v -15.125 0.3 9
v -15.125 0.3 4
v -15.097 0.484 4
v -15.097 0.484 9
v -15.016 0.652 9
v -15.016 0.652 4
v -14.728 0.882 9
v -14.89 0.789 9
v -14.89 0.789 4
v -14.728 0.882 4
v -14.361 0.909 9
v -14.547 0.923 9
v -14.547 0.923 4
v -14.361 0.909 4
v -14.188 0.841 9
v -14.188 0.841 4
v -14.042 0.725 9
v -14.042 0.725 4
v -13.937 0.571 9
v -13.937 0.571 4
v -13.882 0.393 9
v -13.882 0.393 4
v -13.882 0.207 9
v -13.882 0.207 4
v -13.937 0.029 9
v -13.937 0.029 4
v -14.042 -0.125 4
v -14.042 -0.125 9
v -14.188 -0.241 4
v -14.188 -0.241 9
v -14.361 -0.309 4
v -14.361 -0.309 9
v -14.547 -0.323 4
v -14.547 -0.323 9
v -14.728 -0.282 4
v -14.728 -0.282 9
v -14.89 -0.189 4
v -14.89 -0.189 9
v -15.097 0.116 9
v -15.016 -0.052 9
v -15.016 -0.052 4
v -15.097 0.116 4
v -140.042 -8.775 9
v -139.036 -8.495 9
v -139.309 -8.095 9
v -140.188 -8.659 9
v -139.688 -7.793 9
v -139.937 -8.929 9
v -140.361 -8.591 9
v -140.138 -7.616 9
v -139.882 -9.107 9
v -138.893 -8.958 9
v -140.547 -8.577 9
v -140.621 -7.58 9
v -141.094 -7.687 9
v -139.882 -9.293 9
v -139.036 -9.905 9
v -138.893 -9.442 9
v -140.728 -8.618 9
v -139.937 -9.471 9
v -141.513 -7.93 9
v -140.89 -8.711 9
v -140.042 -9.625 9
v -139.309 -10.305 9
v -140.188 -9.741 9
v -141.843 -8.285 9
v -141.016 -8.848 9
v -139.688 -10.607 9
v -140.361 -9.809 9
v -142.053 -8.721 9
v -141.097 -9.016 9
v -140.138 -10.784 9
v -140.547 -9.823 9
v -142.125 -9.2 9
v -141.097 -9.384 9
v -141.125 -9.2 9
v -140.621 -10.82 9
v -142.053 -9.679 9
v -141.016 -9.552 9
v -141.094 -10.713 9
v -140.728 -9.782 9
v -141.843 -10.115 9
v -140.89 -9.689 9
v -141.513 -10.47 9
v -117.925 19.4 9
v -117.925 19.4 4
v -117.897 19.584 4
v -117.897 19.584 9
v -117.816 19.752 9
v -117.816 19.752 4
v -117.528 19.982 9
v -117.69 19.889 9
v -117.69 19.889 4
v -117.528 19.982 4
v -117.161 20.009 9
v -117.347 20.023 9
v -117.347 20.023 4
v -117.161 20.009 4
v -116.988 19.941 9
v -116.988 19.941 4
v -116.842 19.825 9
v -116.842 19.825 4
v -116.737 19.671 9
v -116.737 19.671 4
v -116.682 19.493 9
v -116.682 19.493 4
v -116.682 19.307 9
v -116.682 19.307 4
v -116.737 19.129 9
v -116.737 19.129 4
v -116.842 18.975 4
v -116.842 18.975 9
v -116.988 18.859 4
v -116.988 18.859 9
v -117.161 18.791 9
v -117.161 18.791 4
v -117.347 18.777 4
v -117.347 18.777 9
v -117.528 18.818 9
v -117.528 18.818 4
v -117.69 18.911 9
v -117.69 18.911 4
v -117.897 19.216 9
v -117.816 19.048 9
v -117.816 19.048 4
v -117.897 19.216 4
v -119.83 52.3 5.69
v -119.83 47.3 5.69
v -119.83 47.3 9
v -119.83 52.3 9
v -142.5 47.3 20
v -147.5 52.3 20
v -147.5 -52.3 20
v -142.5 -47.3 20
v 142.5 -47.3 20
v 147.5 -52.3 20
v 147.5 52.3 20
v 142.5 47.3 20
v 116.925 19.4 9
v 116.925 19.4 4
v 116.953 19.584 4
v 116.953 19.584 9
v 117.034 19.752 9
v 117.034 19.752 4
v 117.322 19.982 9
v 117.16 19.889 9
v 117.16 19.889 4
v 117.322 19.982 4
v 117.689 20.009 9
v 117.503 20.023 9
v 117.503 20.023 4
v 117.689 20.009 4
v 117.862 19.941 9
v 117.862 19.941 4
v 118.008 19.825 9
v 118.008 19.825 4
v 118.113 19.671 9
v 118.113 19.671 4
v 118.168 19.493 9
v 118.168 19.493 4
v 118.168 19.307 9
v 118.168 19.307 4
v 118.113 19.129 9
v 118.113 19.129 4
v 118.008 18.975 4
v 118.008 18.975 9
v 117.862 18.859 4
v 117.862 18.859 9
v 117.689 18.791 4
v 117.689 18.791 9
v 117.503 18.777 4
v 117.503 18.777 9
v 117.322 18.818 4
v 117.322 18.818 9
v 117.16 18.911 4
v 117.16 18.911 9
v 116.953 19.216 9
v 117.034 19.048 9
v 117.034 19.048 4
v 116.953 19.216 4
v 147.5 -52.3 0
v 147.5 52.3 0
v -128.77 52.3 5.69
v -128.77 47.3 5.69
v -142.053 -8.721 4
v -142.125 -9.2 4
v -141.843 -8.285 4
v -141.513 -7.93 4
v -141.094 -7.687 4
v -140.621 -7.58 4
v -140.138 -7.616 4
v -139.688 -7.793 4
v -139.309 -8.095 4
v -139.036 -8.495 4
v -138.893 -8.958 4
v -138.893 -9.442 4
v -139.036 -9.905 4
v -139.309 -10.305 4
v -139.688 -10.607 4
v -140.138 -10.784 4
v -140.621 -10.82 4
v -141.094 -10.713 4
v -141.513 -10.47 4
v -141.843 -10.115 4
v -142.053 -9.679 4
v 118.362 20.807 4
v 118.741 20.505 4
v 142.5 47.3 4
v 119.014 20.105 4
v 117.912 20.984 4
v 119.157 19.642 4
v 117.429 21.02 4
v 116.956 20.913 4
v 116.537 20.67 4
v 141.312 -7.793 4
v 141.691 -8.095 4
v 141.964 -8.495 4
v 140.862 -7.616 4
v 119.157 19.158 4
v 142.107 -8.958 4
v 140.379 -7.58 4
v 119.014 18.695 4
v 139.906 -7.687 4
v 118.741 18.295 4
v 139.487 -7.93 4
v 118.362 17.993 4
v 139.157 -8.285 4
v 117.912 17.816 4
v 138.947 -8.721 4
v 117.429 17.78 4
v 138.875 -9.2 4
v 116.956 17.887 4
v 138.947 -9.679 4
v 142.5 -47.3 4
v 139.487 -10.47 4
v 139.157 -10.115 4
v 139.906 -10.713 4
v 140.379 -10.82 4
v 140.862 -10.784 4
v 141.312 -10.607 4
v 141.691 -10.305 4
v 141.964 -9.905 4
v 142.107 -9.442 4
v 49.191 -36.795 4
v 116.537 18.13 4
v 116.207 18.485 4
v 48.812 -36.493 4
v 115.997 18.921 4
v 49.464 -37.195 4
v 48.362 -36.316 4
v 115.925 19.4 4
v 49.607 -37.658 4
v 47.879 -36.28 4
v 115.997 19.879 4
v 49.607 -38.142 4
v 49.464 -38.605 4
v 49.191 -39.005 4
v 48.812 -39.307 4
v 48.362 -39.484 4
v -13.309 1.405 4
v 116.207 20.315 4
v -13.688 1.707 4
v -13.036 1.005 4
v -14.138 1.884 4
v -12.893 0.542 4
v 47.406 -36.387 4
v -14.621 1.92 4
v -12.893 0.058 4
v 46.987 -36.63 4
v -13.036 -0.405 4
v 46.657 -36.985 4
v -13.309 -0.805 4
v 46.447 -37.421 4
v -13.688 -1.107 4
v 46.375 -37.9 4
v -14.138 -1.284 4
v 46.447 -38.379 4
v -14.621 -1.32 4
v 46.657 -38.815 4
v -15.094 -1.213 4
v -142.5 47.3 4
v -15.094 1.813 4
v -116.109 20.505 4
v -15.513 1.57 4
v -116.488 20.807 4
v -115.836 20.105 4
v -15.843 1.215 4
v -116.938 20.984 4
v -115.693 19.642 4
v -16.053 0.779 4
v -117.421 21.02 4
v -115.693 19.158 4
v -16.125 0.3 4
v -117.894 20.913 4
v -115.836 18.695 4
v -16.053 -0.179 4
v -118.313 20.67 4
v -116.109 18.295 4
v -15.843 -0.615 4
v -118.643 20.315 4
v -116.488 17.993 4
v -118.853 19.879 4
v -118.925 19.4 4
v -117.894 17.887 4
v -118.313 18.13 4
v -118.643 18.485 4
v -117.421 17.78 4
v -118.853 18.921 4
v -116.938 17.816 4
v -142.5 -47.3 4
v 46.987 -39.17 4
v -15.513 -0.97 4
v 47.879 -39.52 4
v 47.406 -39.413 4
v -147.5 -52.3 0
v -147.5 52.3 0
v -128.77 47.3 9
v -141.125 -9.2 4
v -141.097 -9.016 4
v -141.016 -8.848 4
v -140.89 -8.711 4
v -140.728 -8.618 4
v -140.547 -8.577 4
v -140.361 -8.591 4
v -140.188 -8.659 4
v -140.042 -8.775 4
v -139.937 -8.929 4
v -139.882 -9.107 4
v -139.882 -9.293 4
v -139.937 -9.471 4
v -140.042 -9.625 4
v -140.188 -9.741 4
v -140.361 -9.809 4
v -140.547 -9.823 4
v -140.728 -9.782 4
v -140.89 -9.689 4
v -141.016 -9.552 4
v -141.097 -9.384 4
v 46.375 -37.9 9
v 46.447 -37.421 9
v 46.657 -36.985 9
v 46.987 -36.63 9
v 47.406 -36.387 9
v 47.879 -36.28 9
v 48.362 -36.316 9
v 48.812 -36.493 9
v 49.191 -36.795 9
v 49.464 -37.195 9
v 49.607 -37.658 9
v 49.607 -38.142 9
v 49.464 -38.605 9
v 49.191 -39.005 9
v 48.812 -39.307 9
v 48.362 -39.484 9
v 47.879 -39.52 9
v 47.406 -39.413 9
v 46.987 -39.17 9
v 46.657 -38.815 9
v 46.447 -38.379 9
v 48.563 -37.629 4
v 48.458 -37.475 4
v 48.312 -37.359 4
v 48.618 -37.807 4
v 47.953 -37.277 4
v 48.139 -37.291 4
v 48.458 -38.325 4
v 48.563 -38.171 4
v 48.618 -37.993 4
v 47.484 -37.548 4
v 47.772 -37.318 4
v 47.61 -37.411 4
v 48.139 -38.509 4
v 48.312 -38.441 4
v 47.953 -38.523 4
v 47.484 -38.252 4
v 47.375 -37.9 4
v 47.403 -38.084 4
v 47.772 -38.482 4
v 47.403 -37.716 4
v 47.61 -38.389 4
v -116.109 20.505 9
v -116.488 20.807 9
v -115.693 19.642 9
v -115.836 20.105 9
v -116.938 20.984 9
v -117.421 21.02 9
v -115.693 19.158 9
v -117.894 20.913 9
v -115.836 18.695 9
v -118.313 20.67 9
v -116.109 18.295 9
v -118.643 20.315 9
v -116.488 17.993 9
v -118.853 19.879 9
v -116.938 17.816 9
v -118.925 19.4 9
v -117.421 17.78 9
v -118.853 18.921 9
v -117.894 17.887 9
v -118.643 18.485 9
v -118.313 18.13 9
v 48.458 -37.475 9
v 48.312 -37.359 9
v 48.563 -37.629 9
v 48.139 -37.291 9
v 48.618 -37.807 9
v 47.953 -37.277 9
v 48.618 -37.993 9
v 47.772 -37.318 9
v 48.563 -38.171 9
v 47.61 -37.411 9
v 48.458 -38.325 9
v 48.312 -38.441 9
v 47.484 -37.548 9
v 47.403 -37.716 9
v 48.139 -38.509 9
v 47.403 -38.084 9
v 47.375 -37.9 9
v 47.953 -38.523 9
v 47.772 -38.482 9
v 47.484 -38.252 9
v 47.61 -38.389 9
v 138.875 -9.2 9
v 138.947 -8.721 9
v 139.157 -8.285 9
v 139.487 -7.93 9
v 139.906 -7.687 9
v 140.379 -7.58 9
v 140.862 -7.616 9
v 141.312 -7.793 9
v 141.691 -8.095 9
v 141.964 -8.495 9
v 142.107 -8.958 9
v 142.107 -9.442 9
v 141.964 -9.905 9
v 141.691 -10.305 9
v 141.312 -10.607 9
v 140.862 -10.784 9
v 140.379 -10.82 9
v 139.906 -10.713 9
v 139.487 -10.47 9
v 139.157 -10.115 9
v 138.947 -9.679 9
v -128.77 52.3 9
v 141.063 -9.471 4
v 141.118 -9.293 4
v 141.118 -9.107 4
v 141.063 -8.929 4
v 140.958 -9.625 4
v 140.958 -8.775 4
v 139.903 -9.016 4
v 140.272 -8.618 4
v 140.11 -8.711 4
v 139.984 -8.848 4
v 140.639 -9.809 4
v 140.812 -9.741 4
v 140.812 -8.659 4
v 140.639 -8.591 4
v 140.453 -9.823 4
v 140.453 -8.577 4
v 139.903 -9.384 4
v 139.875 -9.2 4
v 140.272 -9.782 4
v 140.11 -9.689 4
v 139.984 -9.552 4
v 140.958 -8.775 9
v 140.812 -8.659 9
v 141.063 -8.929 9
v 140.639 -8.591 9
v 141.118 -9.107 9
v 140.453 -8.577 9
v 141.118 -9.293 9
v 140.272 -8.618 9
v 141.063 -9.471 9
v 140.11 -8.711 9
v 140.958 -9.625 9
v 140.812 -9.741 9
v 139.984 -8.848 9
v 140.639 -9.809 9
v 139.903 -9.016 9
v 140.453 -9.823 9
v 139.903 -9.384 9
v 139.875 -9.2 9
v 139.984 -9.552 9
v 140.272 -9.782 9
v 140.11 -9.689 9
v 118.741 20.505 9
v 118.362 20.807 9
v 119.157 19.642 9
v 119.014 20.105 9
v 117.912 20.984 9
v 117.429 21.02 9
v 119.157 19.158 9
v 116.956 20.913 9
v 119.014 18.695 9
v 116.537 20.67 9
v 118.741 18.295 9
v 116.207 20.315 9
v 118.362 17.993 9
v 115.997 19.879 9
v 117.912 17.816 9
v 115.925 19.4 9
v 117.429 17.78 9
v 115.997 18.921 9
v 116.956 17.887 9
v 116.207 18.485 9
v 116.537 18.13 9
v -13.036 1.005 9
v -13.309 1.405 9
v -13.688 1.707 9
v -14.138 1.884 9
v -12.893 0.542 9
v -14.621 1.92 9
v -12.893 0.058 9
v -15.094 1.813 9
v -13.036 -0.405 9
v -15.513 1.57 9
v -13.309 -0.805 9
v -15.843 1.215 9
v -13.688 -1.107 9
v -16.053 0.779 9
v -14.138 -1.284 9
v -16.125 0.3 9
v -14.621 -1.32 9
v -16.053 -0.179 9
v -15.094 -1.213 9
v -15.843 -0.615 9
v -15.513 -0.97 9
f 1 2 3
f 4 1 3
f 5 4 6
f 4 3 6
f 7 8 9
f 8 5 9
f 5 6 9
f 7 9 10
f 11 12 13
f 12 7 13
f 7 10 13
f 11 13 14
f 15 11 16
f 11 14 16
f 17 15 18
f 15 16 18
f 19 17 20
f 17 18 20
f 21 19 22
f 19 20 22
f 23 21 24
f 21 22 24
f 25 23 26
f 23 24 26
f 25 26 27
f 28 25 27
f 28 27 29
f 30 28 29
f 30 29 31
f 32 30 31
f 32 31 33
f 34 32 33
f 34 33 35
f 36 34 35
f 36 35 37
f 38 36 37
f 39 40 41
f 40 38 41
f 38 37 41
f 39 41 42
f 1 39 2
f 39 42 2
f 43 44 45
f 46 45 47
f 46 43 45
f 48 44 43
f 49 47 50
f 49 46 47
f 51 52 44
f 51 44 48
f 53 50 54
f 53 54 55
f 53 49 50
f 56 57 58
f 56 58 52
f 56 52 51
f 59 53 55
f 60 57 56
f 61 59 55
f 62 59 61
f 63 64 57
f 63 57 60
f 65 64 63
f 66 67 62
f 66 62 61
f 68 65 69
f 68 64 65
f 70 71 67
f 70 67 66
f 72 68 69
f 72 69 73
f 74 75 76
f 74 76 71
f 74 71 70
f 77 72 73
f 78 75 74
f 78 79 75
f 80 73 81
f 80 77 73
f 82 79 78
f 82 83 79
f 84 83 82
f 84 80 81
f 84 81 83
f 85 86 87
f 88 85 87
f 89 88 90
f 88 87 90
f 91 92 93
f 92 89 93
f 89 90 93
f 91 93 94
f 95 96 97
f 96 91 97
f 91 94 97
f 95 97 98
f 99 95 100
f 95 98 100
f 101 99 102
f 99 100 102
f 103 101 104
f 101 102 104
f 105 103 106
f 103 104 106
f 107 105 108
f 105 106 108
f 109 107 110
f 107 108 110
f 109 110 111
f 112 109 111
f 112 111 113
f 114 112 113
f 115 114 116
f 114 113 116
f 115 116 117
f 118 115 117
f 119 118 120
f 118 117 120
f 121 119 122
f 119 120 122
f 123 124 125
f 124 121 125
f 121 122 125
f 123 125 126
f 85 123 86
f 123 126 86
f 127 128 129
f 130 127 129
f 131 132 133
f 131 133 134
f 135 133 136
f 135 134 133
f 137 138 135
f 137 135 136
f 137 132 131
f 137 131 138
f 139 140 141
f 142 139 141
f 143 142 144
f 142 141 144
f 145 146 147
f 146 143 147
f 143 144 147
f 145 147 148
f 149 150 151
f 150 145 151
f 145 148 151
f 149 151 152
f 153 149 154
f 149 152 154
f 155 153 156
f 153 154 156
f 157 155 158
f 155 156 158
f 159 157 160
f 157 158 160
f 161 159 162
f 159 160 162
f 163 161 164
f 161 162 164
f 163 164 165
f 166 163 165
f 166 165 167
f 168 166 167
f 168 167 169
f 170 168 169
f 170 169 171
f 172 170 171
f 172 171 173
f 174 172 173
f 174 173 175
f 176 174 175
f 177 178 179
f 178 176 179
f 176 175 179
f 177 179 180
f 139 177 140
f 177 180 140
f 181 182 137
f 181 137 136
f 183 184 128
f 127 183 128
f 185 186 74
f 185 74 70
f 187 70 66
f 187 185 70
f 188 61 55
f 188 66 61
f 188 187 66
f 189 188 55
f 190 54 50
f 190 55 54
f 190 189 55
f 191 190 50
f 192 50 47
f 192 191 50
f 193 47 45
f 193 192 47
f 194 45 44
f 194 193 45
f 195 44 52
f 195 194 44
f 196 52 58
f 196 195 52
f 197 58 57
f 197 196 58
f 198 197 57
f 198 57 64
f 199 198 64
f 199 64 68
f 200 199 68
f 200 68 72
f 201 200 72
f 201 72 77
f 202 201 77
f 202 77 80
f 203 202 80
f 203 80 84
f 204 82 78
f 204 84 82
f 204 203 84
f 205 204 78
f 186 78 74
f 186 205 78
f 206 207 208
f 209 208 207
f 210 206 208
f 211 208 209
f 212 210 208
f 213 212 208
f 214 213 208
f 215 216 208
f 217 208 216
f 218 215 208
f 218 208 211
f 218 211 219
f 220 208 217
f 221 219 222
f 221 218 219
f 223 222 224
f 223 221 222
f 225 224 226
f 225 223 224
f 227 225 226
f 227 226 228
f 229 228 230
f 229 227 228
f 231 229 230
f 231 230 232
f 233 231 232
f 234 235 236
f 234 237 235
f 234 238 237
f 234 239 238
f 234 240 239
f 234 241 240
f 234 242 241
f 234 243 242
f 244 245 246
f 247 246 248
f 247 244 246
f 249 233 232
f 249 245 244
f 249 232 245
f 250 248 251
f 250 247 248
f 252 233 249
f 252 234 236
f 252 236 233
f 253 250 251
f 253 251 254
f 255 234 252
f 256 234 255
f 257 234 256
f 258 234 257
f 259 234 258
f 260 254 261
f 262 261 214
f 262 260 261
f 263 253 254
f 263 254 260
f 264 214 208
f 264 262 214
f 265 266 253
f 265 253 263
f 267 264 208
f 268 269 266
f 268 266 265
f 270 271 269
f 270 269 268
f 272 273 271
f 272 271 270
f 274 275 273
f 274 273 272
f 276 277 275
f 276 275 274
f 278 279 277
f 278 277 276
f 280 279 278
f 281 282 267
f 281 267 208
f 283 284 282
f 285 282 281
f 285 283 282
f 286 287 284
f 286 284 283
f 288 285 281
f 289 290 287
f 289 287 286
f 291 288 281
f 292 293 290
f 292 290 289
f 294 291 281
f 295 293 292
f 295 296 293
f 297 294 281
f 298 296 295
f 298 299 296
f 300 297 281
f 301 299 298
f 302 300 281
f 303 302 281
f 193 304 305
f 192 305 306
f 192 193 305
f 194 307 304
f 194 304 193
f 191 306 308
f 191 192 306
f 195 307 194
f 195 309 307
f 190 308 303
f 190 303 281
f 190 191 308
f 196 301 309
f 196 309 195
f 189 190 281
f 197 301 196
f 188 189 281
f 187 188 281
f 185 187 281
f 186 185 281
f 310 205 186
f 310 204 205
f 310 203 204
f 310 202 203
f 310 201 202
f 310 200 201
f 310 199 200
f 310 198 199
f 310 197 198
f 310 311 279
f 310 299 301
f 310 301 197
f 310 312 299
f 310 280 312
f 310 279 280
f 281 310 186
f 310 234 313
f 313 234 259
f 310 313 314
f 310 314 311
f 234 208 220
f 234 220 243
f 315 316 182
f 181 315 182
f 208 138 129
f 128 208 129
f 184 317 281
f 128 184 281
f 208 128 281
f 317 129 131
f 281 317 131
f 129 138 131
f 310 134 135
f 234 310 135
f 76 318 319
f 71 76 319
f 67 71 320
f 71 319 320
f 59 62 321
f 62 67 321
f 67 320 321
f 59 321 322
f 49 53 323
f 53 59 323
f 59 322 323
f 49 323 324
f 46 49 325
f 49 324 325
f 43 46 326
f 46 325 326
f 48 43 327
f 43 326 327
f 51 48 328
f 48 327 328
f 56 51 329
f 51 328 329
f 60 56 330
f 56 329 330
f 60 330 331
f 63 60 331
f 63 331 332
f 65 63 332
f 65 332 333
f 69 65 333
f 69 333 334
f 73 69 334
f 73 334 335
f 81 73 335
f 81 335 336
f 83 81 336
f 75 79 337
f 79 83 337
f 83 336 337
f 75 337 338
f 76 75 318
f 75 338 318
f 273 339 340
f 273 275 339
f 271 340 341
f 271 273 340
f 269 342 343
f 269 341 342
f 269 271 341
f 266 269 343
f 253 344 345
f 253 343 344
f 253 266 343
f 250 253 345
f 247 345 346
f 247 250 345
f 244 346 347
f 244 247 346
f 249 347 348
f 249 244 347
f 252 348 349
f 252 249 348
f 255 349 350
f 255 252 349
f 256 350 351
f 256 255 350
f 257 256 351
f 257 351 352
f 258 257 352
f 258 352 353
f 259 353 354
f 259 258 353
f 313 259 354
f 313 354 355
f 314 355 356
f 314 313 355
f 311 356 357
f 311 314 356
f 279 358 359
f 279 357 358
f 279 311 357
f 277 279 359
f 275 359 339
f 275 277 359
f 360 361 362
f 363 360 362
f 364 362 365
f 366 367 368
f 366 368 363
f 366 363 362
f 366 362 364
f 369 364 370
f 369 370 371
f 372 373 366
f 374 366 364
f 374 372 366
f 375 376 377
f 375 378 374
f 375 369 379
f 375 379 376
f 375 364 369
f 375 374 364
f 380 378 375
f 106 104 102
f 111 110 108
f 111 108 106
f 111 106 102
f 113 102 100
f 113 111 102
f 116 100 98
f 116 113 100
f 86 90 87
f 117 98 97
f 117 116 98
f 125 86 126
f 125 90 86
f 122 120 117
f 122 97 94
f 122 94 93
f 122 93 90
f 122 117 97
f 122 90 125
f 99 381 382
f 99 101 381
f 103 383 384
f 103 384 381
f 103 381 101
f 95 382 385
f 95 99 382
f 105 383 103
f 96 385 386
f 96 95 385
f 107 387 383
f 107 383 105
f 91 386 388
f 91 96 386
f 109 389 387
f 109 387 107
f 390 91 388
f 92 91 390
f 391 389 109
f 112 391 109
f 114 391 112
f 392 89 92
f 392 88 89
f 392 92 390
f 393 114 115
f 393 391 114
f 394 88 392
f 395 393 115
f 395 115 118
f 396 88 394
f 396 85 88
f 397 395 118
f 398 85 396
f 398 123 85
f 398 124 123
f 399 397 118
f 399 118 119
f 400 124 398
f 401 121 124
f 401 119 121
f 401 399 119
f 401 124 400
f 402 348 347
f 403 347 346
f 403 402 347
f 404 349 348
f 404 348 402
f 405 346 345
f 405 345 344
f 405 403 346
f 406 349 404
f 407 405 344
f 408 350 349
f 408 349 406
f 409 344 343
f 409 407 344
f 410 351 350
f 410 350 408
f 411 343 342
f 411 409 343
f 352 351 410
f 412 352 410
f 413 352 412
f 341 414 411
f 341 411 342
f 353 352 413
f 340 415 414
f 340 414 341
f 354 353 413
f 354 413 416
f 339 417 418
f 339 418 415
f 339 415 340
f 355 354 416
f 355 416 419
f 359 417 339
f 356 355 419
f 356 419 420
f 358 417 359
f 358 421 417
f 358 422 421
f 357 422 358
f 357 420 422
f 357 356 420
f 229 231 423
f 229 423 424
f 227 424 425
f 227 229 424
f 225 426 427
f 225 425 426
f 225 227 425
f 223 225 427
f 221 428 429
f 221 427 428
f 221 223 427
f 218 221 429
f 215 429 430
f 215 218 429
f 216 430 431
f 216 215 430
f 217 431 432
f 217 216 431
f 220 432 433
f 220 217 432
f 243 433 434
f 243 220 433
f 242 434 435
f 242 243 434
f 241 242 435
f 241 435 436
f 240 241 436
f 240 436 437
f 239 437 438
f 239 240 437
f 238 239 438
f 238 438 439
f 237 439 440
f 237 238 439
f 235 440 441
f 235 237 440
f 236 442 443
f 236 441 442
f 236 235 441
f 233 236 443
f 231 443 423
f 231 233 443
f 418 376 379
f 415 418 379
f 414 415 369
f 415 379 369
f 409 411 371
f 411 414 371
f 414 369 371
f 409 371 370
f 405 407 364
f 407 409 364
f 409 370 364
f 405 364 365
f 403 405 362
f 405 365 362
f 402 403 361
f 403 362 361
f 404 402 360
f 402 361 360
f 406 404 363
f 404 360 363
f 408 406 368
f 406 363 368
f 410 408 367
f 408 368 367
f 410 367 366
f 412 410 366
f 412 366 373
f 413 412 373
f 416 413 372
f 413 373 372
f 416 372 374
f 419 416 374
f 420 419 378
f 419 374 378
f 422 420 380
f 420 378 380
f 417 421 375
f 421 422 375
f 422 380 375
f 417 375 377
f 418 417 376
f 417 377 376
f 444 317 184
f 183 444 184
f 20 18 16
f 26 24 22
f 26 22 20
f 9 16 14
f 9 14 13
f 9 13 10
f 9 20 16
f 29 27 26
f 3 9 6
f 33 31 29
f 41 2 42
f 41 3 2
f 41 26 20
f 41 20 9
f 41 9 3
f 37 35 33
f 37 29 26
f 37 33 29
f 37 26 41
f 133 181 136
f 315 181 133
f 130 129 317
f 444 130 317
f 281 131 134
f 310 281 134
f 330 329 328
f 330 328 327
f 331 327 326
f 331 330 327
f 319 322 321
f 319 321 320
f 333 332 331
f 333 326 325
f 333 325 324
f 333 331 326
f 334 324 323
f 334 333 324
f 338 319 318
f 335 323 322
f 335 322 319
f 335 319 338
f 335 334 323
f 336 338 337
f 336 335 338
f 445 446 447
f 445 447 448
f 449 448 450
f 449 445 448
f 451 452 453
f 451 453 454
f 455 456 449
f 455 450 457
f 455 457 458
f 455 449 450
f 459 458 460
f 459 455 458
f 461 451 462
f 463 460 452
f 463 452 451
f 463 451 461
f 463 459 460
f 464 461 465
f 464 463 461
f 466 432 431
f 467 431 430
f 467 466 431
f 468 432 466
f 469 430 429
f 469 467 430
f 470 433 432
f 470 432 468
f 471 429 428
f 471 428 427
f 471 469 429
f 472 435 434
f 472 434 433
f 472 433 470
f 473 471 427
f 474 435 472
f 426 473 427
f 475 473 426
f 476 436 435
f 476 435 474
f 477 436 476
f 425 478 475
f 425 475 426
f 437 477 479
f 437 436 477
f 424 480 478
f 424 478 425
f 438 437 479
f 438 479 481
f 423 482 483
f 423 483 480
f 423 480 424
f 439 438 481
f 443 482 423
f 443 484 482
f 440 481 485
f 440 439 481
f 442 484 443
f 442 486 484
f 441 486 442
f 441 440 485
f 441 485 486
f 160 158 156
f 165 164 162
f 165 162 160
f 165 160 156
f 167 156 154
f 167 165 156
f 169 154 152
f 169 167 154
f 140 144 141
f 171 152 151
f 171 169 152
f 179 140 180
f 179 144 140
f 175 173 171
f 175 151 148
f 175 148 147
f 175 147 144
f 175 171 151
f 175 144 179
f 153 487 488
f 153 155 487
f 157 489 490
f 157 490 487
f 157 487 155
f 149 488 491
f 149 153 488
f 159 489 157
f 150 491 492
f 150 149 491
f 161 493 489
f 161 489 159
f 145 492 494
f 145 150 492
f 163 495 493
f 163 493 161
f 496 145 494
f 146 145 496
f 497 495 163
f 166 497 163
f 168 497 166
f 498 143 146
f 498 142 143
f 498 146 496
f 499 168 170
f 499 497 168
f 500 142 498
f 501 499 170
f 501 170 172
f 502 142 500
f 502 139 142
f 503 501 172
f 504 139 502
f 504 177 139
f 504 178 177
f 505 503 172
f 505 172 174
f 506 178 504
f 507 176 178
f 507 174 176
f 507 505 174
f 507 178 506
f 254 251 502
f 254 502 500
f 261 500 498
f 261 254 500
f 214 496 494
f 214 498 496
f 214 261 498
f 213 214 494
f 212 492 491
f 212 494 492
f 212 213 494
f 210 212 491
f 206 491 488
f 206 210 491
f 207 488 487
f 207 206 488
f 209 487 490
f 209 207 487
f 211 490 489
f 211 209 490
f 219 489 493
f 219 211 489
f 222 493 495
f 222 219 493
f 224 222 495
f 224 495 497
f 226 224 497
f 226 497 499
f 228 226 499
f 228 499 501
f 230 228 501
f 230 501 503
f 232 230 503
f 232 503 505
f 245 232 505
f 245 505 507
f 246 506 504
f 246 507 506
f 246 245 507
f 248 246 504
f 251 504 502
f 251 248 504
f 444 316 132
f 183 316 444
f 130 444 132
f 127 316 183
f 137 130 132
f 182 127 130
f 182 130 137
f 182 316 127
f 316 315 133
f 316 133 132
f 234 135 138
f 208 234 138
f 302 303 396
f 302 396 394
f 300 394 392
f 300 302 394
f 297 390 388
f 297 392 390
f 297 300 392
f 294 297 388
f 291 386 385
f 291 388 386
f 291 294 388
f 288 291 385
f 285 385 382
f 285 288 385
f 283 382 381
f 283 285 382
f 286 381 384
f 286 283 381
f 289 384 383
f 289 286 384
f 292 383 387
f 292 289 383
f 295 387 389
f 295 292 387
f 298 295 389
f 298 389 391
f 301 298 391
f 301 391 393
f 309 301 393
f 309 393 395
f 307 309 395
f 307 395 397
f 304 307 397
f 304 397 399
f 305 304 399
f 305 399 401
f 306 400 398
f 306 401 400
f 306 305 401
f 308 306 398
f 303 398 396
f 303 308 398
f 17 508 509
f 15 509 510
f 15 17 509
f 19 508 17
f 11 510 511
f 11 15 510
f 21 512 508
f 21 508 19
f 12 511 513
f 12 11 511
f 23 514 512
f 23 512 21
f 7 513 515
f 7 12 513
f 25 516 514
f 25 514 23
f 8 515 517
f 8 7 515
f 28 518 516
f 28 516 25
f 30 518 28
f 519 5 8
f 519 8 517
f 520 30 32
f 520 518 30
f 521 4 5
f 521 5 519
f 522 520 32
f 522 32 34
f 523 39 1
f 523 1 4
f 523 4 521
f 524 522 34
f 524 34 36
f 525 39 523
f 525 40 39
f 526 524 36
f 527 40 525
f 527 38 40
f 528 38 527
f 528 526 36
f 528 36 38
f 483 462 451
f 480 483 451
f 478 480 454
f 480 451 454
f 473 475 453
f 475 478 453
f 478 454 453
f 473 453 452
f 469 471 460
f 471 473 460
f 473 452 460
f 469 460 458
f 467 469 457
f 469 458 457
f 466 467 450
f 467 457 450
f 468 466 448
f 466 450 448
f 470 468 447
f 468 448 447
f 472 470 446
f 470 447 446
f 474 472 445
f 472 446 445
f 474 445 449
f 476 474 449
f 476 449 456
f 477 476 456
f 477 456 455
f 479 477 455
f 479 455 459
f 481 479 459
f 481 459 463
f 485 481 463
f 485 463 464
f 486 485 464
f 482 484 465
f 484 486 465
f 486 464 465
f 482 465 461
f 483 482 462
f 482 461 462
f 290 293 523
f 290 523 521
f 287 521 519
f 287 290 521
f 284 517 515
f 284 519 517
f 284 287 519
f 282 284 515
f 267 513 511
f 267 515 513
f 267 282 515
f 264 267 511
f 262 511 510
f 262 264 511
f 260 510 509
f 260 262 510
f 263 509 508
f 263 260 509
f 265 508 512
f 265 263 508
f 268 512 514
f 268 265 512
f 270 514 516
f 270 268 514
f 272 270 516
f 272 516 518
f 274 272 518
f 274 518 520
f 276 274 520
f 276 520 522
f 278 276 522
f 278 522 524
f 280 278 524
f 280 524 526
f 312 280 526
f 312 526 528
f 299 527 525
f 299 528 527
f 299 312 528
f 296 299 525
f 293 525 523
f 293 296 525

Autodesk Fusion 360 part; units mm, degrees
sketch "Body" plane through (0, 0, 0) normal (0, 0, 1) x (1, 0, 0)
  line L0 (147.5, -52.3) -> (-147.5, -52.3)
  line L1 (-147.5, -52.3) -> (-147.5, 52.3)
  line L2 (-147.5, 52.3) -> (147.5, 52.3)
  line L3 (147.5, 52.3) -> (147.5, -52.3)
  line L4 (147.5, -52.3) -> (-147.5, 52.3) construction
  line L5 (-147.5, -52.3) -> (147.5, 52.3) construction
  dimension "d15" = 295
  dimension "d16" = 104.6
extrude "Extrude3" add sketch "Body" along normal blind 20
sketch "Walls" plane through (0, 0, 20) normal (0, 0, 1) x (-1, 0, 0)
  line L0 (-147.5, -52.3) -> (147.5, -52.3)
  line L1 (147.5, -52.3) -> (147.5, 52.3)
  line L2 (147.5, 52.3) -> (-147.5, 52.3)
  line L3 (-147.5, 52.3) -> (-147.5, -52.3)
  line L4 (142.5, 47.3) -> (-142.5, 47.3)
  line L5 (-142.5, 47.3) -> (-142.5, -47.3)
  line L6 (-142.5, -47.3) -> (142.5, -47.3)
  line L7 (142.5, -47.3) -> (142.5, 47.3)
  dimension "d19" = -5
extrude "Extrude4" cut sketch "Walls" against normal up to surface (16 mm away) contours L4 L5 L6 L7
sketch "Screws" plane through (0, 0, 4) normal (0, 0, 1) x (-1, 0, 0)
  line L0 (142.5, 47.3) -> (-142.5, 47.3)
  line L1 (-142.5, 47.3) -> (-142.5, -47.3)
  line L2 (-142.5, -47.3) -> (142.5, -47.3)
  line L3 (142.5, -47.3) -> (142.5, 47.3)
  circle A0 centre (117.3, -19.4) radius 1.625
  circle A1 centre (140.5, 9.2) radius 1.625
  circle A2 centre (14.5, -0.3) radius 1.625
  circle A3 centre (-48, 37.9) radius 1.625
  circle A4 centre (-117.55, -19.4) radius 1.625
  circle A5 centre (-140.5, 9.2) radius 1.625
  circle A6 centre (140.5, 9.2) radius 0.625
  circle A7 centre (117.3, -19.4) radius 0.625
  circle A8 centre (14.5, -0.3) radius 0.625
  circle A9 centre (-48, 37.9) radius 0.625
  circle A10 centre (-117.55, -19.4) radius 0.625
  circle A11 centre (-140.5, 9.2) radius 0.625
  point P0 (117.3, -19.4)
  dimension "d32" = 3.25
  dimension "d33" = 27.9
  dimension "d34" = 25.2
  dimension "d35" = 3.25
  dimension "d36" = 2
  dimension "d37" = 56.5
  dimension "d38" = 3.25
  dimension "d39" = 128
  dimension "d40" = 47
  dimension "d41" = 3.25
  dimension "d42" = 85.2
  dimension "d43" = 190.5
  dimension "d44" = 3.25
  dimension "d45" = 27.9
  dimension "d46" = 24.95
  dimension "d47" = 3.25
  dimension "d48" = 56.5
  dimension "d49" = 2
  dimension "d57" = -1
  dimension "d58" = -1
  dimension "d59" = -1
  dimension "d60" = -1
  dimension "d61" = -1
  dimension "d62" = -1
extrude "Extrude9" add sketch "Screws" along normal blind 5 contours A0 | A1 | A2 | A3 | A4 | A5
fillet "Fillet1" [suppressed]
thread "Thread2" [suppressed]
sketch "Sketch13" plane through (0, 47.3, 0) normal (0, -1, 0) x (1, 0, 0)
  line L0 (-142.5, 4) -> (142.5, 4)
  line L1 (142.5, 4) -> (142.5, 20)
  line L2 (142.5, 20) -> (-142.5, 20)
  line L3 (-142.5, 20) -> (-142.5, 4)
  line L4 (-119.83, 9) -> (-128.77, 9)
  line L5 (-128.77, 9) -> (-128.77, 5.69)
  line L6 (-128.77, 5.69) -> (-119.83, 5.69)
  line L7 (-119.83, 5.69) -> (-119.83, 9)
  line L8 (-119.83, 9) -> (-128.77, 5.69) construction
  line L9 (-128.77, 9) -> (-119.83, 5.69) construction
  line L10 (142.5, 4) -> (-142.5, 4)
  point P0 (-124.3, 7.345)
  dimension "d65" = 8.94
  dimension "d66" = 3.31
  dimension "d67" = 18.2
  dimension "d71" = 5
extrude "Extrude10" cut sketch "Sketch13" against normal up to surface (5 mm away) contours L4 L5 L6 L7
fillet "Fillet3" [suppressed]
equation "d15 = 285 mm + 10 mm"
equation "d16 = 94.6 mm + 10 mm"
equation "d32 = 2 mm + 1.25 mm"
equation "d67 = 25.2 mm - 7 mm"
equation "d73 = ( 3.31 / 2 ) * 1 mm"
